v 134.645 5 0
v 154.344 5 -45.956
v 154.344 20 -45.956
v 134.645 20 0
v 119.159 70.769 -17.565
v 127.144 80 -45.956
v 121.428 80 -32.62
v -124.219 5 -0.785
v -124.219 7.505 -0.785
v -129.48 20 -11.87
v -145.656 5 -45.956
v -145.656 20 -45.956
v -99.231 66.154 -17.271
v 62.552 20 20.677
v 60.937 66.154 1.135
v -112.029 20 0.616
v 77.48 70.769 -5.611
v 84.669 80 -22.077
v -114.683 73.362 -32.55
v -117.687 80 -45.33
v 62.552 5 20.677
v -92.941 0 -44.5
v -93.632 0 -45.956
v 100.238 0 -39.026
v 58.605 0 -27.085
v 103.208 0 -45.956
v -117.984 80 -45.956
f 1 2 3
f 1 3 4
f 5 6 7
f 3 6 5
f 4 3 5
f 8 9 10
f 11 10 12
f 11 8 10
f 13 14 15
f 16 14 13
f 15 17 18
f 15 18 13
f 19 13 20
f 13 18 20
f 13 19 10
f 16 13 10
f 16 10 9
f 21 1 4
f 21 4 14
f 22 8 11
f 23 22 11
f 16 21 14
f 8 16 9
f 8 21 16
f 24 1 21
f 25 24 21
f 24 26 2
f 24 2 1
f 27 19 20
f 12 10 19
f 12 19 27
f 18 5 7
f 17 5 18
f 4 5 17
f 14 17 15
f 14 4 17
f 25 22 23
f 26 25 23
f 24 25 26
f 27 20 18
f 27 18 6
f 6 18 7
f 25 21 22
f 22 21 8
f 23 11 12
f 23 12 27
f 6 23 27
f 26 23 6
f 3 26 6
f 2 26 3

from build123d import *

# Parameters (mm, degrees)
F1_DEPTH = 80
F2_SIZE2 = 60
F2_SIZE  = 25
F3_SIZE2 = 5
F3_SIZE  = 47
F4_SIZE  = 10
F5_SIZE2 = 20
F5_SIZE  = 15
F6_SIZE  = 12


with BuildPart() as f1:
    # F0 (on Front) → F1 (new body)
    with BuildSketch(Plane.XZ):
        Polygon((-124.2189471151, -0.7847668109), (-145.6560869584, -45.9560966047), (154.3439130416, -45.9560966047), (134.6452535731, 0), (62.5519627112, 20.6774614667), align=None)
    extrude(amount=-F1_DEPTH)

    # F2
    f2_edges = [f1.edges().sort_by_distance(p)[0] for p in [
        (-30.833492, 80, 9.946347),
        (98.598608, 80, 10.338731),
        (144.494583, 80, -22.978048),
        (-134.937517, 80, -23.370432),
    ]]
    f2_side = f1.faces().sort_by_distance((8.549856, 80, -18.412725))[0]
    chamfer(f2_edges, length=F2_SIZE, length2=F2_SIZE2, reference=f2_side)

    # F3
    f3_edges = [f1.edges().sort_by_distance(p)[0] for p in [
        (-30.833492, 0, 9.946347),
        (-134.937517, 0, -23.370432),
        (98.598608, 0, 10.338731),
        (144.494583, 0, -22.978048),
    ]]
    f3_side = f1.faces().sort_by_distance((8.549856, 0, -18.412725))[0]
    chamfer(f3_edges, length=F3_SIZE, length2=F3_SIZE2, reference=f3_side)

    # F4
    f4_edges = [f1.edges().sort_by_distance(p)[0] for p in [
        (88.397911, 80, -12.743521),
    ]]
    chamfer(f4_edges, length=F4_SIZE)

    # F5
    f5_edges = [f1.edges().sort_by_distance(p)[0] for p in [
        (-36.512691, 80, -15.870779),
    ]]
    f5_side = f1.faces().sort_by_distance((-28.16235, 49.160168, -1.976733))[0]
    chamfer(f5_edges, length=F5_SIZE, length2=F5_SIZE2, reference=f5_side)

    # F6
    f6_edges = [f1.edges().sort_by_distance(p)[0] for p in [
        (-117.819987, 43.076923, -9.72811),
    ]]
    chamfer(f6_edges, length=F6_SIZE)


solid = f1.part
